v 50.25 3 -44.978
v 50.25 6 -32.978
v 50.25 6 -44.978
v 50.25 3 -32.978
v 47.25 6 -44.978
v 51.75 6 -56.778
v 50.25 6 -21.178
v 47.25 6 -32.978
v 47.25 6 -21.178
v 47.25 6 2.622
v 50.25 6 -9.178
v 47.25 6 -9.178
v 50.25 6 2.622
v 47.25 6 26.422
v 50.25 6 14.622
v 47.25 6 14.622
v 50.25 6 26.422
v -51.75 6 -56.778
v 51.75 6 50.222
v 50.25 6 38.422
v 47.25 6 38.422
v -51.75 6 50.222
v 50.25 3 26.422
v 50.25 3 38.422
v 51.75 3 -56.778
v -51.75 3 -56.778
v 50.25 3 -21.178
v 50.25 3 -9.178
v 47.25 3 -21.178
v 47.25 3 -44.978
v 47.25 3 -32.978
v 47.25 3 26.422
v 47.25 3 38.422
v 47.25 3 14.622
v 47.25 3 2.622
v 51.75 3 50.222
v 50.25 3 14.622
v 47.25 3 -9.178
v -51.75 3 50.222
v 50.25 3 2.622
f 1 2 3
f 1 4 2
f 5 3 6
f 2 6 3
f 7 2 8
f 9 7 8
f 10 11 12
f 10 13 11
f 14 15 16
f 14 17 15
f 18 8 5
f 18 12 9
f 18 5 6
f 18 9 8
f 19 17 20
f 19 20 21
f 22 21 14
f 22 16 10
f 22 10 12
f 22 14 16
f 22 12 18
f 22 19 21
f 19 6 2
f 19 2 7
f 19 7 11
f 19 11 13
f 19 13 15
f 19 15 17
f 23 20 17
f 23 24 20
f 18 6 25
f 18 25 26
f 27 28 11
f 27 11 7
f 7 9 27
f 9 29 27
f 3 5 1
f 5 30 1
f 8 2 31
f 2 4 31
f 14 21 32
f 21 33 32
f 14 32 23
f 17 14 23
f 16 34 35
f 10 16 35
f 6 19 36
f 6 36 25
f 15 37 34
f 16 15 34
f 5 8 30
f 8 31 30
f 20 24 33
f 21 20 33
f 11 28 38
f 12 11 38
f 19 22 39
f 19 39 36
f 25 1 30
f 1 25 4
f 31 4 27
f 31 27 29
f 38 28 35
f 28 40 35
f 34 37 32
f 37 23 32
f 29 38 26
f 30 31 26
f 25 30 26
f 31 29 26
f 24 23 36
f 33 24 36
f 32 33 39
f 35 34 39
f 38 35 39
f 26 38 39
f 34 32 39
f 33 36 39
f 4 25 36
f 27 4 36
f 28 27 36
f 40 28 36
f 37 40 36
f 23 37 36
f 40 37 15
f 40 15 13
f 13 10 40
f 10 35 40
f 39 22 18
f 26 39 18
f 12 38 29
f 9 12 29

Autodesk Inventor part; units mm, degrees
ref_plane "YZ Plane" through (0, 0, 0) normal (1, 0, 0) x (0, 1, 0)
ref_plane "XZ Plane" through (0, 0, 0) normal (0, 1, 0) x (-1, 0, 0)
ref_plane "Plano de trabalho1" through (-46, 6, -51.528) normal (0, -1, 0) x (1, 0, 0)
sketch "Esboço5" plane through (0, 0, 0) normal (0, 1, 0) x (-1, 0, 0)
  line L0 (51.75, 50.222) -> (51.75, -56.778)
  line L1 (51.75, -21.778) -> (51.75, -56.778)
  line L2 (51.75, 50.222) -> (-51.75, 50.222)
  line L3 (-51.75, 50.222) -> (-51.75, -56.778)
  line L4 (-51.75, -56.778) -> (51.75, -56.778)
  point P0 (0, 0)
  dimension "d28" = 51.75
  dimension "d30" = 103.5
extrude "Extrusão4" add sketch "Esboço5" against normal blind 3 from surface at 6
sketch "Esboço7" plane through (-51.75, 3, 50.222) normal (0, -1, 0) x (1, 0, 0)
  line L0 (99, -95.2) -> (102, -95.2) projected
  line L1 (102, -83.2) -> (102, -95.2) projected
  line L2 (102, -83.2) -> (99, -83.2) projected
  line L3 (99, -83.2) -> (99, -95.2) projected
  line L4 (99, -71.4) -> (102, -71.4) projected
  line L5 (102, -59.4) -> (102, -71.4) projected
  line L6 (102, -59.4) -> (99, -59.4) projected
  line L7 (99, -59.4) -> (99, -71.4) projected
  line L8 (102, -35.6) -> (99, -35.6) projected
  line L9 (99, -35.6) -> (99, -47.6) projected
  line L10 (99, -47.6) -> (102, -47.6) projected
  line L11 (102, -35.6) -> (102, -47.6) projected
  line L12 (102, -11.8) -> (99, -11.8) projected
  line L13 (99, -11.8) -> (99, -23.8) projected
  line L14 (99, -23.8) -> (102, -23.8) projected
  line L15 (102, -11.8) -> (102, -23.8) projected
  line L16 (102, -95.2) -> (99, -95.2)
  line L17 (99, -95.2) -> (99, -83.2)
  line L18 (99, -83.2) -> (102, -83.2)
  line L19 (102, -83.2) -> (102, -95.2)
  line L20 (102, -71.4) -> (99, -71.4)
  line L21 (99, -71.4) -> (99, -59.4)
  line L22 (99, -59.4) -> (102, -59.4)
  line L23 (102, -59.4) -> (102, -71.4)
  line L24 (102, -47.6) -> (99, -47.6)
  line L25 (99, -47.6) -> (99, -35.6)
  line L26 (99, -35.6) -> (102, -35.6)
  line L27 (102, -35.6) -> (102, -47.6)
  line L28 (102, -23.8) -> (99, -23.8)
  line L29 (99, -23.8) -> (99, -11.8)
  line L30 (99, -11.8) -> (102, -11.8)
  line L31 (102, -11.8) -> (102, -23.8)
  point P0 (51.75, -50.222)
extrude "Extrusão5" cut sketch "Esboço7" against normal blind 3
equation "\"d30\" = 2 * d28"
properties part number "Chassi_mid"
